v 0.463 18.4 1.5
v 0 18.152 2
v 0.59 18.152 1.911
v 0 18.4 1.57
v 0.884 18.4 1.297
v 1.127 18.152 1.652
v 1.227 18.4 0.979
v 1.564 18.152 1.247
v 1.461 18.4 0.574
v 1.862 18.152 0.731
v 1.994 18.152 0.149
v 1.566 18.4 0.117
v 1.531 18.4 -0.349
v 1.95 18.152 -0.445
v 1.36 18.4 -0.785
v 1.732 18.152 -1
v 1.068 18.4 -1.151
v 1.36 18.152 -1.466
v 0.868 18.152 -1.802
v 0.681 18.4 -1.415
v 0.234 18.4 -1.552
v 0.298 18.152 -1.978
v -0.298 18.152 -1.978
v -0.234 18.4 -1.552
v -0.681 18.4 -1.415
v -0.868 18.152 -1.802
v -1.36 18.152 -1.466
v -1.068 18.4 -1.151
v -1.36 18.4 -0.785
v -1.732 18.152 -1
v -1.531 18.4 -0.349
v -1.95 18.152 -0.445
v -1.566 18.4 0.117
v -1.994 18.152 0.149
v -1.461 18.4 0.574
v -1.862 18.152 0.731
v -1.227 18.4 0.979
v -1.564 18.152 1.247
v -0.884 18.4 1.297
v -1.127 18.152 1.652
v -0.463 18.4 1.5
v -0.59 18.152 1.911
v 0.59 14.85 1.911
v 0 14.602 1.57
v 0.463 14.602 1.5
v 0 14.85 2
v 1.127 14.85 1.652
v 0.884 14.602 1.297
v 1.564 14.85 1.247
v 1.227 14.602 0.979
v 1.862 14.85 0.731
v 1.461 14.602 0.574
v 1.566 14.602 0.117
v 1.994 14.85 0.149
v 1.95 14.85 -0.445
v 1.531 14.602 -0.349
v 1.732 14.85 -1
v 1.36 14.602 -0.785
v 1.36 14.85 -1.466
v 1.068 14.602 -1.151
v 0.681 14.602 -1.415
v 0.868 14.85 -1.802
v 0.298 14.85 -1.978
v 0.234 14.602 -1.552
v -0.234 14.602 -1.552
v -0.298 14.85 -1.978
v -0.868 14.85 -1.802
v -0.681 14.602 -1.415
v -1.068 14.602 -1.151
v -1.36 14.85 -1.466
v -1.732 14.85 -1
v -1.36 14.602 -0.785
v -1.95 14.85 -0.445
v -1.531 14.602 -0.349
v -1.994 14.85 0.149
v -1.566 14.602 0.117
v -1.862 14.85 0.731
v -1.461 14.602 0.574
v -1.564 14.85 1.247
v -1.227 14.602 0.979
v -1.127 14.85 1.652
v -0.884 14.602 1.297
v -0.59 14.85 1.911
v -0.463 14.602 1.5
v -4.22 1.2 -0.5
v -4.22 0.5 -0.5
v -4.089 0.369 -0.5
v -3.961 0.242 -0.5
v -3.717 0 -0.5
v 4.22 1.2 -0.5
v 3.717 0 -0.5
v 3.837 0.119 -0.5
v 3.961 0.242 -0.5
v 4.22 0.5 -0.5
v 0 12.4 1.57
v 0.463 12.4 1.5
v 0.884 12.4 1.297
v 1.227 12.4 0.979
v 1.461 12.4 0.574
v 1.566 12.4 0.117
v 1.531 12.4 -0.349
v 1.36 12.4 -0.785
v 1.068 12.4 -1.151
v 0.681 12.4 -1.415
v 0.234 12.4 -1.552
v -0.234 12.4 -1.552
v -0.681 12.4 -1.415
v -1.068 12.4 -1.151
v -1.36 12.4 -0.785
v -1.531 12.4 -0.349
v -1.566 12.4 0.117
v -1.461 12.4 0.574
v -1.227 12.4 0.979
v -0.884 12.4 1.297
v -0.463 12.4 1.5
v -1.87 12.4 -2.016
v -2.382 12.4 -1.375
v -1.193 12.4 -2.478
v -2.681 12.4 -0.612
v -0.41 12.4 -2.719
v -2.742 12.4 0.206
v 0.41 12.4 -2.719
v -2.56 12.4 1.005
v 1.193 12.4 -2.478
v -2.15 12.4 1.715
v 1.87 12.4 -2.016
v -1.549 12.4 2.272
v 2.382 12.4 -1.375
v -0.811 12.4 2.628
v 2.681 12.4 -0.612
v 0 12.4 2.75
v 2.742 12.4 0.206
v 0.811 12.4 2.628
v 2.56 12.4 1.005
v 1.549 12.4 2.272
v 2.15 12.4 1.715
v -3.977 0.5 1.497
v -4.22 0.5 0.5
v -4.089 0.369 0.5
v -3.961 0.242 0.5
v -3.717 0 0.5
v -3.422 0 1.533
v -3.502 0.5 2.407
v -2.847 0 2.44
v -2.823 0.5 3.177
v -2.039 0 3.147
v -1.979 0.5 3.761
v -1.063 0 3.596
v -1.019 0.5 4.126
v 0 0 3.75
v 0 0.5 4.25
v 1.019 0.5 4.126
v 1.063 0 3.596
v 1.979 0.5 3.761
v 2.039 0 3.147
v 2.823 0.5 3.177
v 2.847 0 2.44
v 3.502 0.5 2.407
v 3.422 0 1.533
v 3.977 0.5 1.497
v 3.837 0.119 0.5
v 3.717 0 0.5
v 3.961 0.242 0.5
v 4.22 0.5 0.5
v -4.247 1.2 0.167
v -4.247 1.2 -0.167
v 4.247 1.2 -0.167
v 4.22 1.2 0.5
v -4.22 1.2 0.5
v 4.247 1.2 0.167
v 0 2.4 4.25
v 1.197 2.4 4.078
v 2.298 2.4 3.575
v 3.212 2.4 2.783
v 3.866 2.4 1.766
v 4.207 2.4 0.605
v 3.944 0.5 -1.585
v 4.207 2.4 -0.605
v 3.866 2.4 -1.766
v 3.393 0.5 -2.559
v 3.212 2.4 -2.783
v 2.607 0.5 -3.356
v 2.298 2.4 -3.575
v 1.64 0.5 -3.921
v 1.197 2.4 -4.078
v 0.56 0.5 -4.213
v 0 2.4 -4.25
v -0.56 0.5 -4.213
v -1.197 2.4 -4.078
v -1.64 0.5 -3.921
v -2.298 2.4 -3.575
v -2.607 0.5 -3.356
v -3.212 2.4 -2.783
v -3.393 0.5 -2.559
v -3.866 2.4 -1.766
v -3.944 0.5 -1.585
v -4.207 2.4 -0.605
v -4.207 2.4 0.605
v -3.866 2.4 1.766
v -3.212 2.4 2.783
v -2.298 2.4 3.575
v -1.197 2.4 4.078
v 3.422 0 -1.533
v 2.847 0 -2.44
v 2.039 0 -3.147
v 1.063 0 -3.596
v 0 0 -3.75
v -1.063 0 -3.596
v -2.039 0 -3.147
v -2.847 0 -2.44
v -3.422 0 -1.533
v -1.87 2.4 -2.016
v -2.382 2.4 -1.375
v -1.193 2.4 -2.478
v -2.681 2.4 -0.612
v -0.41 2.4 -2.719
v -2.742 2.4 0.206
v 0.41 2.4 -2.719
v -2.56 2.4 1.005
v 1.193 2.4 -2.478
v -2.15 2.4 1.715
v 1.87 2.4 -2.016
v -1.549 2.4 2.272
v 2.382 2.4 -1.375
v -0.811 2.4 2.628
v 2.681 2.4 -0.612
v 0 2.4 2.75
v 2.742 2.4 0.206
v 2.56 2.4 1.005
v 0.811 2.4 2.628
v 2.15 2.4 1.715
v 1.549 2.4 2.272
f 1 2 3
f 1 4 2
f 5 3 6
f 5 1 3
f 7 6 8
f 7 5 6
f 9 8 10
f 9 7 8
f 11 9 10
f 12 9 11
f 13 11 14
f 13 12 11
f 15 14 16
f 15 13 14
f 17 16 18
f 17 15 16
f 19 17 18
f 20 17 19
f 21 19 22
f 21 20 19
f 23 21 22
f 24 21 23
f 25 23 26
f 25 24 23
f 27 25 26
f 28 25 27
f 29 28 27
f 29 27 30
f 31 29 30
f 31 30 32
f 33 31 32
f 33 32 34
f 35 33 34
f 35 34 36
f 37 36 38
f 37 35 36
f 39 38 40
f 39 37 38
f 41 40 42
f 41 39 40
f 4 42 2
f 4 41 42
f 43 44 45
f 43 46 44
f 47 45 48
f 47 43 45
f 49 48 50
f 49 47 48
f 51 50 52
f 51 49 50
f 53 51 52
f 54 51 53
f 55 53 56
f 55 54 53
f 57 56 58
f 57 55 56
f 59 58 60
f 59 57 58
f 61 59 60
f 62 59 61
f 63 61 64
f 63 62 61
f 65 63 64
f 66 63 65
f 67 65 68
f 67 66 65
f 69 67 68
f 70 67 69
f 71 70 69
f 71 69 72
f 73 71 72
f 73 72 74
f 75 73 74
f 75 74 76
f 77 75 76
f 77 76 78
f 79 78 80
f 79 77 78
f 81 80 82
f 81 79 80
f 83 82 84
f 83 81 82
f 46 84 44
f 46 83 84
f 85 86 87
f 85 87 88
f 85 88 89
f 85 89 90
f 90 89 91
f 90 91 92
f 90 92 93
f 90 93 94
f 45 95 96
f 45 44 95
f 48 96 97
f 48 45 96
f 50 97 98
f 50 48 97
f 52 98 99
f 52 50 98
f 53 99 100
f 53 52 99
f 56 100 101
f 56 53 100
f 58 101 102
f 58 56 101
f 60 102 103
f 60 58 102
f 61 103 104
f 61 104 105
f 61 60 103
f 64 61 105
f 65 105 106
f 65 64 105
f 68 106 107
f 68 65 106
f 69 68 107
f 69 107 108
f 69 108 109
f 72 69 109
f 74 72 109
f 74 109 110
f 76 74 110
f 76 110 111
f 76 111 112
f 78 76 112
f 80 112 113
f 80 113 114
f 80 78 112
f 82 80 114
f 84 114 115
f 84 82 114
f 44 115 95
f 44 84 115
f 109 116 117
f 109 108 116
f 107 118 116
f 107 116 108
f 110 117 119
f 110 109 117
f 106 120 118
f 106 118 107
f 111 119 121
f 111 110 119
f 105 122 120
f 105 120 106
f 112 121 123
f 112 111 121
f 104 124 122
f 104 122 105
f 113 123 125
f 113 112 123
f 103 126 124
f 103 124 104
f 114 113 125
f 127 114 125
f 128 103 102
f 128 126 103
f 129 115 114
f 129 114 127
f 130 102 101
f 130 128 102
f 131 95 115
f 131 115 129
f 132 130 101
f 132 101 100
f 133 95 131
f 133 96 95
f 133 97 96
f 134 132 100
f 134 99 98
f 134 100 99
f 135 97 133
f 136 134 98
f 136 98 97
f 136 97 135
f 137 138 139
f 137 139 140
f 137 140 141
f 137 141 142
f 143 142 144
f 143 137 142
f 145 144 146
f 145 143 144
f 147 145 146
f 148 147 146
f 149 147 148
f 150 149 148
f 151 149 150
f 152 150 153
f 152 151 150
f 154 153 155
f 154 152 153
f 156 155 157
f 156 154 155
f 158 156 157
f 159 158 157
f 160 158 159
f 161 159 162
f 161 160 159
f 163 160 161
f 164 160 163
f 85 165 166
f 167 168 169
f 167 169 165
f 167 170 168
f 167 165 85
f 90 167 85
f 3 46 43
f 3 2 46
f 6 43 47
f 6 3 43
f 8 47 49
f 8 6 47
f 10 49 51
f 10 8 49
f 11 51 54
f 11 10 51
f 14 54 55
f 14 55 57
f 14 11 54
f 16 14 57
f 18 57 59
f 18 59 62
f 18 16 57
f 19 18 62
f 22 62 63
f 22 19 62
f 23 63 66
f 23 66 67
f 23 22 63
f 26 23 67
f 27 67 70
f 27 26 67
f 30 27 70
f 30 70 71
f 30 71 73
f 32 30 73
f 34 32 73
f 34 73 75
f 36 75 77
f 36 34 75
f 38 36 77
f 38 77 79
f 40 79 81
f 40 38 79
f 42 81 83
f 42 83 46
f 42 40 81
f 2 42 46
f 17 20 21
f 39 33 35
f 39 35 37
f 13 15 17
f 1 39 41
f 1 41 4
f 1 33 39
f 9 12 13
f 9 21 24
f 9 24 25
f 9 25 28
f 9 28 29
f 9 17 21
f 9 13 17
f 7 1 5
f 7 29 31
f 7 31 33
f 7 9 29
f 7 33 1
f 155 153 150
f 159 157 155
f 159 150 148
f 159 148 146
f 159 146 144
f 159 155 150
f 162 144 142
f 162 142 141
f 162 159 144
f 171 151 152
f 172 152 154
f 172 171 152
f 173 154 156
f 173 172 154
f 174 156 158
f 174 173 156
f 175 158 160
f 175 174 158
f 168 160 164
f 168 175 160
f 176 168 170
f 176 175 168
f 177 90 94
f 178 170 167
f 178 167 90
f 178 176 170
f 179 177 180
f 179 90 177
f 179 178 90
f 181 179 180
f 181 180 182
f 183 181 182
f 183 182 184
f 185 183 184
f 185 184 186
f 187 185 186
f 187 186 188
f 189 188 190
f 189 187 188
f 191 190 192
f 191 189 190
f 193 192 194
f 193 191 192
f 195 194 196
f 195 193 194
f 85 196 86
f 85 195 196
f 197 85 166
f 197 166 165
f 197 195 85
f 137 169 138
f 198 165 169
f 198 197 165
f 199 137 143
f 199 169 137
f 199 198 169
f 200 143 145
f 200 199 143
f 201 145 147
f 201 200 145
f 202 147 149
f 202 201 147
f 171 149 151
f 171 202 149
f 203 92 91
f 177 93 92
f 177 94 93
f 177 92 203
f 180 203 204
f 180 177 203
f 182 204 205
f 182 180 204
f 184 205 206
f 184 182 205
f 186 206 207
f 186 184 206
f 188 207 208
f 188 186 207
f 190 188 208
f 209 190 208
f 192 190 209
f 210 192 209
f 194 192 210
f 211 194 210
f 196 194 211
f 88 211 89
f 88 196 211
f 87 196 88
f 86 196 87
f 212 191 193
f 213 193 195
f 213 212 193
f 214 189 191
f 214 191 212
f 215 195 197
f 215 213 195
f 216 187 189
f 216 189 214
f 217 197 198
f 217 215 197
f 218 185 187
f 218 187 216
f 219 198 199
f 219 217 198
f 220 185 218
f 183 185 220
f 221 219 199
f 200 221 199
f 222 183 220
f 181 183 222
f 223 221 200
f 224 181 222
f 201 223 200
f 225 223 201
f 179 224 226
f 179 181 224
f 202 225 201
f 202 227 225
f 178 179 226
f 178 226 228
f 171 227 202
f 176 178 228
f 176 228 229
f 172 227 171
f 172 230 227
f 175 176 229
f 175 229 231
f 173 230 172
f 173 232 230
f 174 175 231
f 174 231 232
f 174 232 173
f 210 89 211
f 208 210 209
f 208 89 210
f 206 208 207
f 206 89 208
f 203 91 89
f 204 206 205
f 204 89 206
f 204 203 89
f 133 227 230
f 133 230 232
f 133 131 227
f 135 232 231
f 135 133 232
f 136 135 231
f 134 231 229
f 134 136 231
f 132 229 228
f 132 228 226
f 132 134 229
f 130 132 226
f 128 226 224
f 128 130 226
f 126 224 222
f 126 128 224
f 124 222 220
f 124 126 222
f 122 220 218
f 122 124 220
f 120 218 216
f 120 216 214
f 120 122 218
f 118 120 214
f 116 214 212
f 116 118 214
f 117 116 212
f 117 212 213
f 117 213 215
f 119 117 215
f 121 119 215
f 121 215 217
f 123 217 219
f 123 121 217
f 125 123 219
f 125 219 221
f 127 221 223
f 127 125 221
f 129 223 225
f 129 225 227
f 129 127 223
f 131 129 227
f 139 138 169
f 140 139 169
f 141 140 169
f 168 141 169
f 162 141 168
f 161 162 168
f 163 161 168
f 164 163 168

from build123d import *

# Parameters (mm, degrees)
SKETCH001_W  = 1
SKETCH001_H  = 8.5
POCKET_DEPTH = 1.2


with BuildPart() as part:
    # Sketch → Revolution (revolve)
    with BuildSketch(Plane.YZ):
        Polygon((0, 0), (0, 3.75), (0.5, 4.25), (2.4, 4.25), (2.4, 2.75), (12.4, 2.75), (12.4, 1.57), (14.601739, 1.57), (14.85, 2), (18.151739, 2), (18.4, 1.57), (18.4, 0), align=None)
    revolve(axis=Axis((0, 0, 0), (0, 1, 0)))

    # Sketch001 → Pocket (cut)
    with BuildSketch(Plane(origin=(0, 0, 0), x_dir=(0, 0, -1), z_dir=(0, -1, 0))):
        Rectangle(SKETCH001_W, SKETCH001_H)
    extrude(amount=-POCKET_DEPTH, mode=Mode.SUBTRACT)


solid = part.part
